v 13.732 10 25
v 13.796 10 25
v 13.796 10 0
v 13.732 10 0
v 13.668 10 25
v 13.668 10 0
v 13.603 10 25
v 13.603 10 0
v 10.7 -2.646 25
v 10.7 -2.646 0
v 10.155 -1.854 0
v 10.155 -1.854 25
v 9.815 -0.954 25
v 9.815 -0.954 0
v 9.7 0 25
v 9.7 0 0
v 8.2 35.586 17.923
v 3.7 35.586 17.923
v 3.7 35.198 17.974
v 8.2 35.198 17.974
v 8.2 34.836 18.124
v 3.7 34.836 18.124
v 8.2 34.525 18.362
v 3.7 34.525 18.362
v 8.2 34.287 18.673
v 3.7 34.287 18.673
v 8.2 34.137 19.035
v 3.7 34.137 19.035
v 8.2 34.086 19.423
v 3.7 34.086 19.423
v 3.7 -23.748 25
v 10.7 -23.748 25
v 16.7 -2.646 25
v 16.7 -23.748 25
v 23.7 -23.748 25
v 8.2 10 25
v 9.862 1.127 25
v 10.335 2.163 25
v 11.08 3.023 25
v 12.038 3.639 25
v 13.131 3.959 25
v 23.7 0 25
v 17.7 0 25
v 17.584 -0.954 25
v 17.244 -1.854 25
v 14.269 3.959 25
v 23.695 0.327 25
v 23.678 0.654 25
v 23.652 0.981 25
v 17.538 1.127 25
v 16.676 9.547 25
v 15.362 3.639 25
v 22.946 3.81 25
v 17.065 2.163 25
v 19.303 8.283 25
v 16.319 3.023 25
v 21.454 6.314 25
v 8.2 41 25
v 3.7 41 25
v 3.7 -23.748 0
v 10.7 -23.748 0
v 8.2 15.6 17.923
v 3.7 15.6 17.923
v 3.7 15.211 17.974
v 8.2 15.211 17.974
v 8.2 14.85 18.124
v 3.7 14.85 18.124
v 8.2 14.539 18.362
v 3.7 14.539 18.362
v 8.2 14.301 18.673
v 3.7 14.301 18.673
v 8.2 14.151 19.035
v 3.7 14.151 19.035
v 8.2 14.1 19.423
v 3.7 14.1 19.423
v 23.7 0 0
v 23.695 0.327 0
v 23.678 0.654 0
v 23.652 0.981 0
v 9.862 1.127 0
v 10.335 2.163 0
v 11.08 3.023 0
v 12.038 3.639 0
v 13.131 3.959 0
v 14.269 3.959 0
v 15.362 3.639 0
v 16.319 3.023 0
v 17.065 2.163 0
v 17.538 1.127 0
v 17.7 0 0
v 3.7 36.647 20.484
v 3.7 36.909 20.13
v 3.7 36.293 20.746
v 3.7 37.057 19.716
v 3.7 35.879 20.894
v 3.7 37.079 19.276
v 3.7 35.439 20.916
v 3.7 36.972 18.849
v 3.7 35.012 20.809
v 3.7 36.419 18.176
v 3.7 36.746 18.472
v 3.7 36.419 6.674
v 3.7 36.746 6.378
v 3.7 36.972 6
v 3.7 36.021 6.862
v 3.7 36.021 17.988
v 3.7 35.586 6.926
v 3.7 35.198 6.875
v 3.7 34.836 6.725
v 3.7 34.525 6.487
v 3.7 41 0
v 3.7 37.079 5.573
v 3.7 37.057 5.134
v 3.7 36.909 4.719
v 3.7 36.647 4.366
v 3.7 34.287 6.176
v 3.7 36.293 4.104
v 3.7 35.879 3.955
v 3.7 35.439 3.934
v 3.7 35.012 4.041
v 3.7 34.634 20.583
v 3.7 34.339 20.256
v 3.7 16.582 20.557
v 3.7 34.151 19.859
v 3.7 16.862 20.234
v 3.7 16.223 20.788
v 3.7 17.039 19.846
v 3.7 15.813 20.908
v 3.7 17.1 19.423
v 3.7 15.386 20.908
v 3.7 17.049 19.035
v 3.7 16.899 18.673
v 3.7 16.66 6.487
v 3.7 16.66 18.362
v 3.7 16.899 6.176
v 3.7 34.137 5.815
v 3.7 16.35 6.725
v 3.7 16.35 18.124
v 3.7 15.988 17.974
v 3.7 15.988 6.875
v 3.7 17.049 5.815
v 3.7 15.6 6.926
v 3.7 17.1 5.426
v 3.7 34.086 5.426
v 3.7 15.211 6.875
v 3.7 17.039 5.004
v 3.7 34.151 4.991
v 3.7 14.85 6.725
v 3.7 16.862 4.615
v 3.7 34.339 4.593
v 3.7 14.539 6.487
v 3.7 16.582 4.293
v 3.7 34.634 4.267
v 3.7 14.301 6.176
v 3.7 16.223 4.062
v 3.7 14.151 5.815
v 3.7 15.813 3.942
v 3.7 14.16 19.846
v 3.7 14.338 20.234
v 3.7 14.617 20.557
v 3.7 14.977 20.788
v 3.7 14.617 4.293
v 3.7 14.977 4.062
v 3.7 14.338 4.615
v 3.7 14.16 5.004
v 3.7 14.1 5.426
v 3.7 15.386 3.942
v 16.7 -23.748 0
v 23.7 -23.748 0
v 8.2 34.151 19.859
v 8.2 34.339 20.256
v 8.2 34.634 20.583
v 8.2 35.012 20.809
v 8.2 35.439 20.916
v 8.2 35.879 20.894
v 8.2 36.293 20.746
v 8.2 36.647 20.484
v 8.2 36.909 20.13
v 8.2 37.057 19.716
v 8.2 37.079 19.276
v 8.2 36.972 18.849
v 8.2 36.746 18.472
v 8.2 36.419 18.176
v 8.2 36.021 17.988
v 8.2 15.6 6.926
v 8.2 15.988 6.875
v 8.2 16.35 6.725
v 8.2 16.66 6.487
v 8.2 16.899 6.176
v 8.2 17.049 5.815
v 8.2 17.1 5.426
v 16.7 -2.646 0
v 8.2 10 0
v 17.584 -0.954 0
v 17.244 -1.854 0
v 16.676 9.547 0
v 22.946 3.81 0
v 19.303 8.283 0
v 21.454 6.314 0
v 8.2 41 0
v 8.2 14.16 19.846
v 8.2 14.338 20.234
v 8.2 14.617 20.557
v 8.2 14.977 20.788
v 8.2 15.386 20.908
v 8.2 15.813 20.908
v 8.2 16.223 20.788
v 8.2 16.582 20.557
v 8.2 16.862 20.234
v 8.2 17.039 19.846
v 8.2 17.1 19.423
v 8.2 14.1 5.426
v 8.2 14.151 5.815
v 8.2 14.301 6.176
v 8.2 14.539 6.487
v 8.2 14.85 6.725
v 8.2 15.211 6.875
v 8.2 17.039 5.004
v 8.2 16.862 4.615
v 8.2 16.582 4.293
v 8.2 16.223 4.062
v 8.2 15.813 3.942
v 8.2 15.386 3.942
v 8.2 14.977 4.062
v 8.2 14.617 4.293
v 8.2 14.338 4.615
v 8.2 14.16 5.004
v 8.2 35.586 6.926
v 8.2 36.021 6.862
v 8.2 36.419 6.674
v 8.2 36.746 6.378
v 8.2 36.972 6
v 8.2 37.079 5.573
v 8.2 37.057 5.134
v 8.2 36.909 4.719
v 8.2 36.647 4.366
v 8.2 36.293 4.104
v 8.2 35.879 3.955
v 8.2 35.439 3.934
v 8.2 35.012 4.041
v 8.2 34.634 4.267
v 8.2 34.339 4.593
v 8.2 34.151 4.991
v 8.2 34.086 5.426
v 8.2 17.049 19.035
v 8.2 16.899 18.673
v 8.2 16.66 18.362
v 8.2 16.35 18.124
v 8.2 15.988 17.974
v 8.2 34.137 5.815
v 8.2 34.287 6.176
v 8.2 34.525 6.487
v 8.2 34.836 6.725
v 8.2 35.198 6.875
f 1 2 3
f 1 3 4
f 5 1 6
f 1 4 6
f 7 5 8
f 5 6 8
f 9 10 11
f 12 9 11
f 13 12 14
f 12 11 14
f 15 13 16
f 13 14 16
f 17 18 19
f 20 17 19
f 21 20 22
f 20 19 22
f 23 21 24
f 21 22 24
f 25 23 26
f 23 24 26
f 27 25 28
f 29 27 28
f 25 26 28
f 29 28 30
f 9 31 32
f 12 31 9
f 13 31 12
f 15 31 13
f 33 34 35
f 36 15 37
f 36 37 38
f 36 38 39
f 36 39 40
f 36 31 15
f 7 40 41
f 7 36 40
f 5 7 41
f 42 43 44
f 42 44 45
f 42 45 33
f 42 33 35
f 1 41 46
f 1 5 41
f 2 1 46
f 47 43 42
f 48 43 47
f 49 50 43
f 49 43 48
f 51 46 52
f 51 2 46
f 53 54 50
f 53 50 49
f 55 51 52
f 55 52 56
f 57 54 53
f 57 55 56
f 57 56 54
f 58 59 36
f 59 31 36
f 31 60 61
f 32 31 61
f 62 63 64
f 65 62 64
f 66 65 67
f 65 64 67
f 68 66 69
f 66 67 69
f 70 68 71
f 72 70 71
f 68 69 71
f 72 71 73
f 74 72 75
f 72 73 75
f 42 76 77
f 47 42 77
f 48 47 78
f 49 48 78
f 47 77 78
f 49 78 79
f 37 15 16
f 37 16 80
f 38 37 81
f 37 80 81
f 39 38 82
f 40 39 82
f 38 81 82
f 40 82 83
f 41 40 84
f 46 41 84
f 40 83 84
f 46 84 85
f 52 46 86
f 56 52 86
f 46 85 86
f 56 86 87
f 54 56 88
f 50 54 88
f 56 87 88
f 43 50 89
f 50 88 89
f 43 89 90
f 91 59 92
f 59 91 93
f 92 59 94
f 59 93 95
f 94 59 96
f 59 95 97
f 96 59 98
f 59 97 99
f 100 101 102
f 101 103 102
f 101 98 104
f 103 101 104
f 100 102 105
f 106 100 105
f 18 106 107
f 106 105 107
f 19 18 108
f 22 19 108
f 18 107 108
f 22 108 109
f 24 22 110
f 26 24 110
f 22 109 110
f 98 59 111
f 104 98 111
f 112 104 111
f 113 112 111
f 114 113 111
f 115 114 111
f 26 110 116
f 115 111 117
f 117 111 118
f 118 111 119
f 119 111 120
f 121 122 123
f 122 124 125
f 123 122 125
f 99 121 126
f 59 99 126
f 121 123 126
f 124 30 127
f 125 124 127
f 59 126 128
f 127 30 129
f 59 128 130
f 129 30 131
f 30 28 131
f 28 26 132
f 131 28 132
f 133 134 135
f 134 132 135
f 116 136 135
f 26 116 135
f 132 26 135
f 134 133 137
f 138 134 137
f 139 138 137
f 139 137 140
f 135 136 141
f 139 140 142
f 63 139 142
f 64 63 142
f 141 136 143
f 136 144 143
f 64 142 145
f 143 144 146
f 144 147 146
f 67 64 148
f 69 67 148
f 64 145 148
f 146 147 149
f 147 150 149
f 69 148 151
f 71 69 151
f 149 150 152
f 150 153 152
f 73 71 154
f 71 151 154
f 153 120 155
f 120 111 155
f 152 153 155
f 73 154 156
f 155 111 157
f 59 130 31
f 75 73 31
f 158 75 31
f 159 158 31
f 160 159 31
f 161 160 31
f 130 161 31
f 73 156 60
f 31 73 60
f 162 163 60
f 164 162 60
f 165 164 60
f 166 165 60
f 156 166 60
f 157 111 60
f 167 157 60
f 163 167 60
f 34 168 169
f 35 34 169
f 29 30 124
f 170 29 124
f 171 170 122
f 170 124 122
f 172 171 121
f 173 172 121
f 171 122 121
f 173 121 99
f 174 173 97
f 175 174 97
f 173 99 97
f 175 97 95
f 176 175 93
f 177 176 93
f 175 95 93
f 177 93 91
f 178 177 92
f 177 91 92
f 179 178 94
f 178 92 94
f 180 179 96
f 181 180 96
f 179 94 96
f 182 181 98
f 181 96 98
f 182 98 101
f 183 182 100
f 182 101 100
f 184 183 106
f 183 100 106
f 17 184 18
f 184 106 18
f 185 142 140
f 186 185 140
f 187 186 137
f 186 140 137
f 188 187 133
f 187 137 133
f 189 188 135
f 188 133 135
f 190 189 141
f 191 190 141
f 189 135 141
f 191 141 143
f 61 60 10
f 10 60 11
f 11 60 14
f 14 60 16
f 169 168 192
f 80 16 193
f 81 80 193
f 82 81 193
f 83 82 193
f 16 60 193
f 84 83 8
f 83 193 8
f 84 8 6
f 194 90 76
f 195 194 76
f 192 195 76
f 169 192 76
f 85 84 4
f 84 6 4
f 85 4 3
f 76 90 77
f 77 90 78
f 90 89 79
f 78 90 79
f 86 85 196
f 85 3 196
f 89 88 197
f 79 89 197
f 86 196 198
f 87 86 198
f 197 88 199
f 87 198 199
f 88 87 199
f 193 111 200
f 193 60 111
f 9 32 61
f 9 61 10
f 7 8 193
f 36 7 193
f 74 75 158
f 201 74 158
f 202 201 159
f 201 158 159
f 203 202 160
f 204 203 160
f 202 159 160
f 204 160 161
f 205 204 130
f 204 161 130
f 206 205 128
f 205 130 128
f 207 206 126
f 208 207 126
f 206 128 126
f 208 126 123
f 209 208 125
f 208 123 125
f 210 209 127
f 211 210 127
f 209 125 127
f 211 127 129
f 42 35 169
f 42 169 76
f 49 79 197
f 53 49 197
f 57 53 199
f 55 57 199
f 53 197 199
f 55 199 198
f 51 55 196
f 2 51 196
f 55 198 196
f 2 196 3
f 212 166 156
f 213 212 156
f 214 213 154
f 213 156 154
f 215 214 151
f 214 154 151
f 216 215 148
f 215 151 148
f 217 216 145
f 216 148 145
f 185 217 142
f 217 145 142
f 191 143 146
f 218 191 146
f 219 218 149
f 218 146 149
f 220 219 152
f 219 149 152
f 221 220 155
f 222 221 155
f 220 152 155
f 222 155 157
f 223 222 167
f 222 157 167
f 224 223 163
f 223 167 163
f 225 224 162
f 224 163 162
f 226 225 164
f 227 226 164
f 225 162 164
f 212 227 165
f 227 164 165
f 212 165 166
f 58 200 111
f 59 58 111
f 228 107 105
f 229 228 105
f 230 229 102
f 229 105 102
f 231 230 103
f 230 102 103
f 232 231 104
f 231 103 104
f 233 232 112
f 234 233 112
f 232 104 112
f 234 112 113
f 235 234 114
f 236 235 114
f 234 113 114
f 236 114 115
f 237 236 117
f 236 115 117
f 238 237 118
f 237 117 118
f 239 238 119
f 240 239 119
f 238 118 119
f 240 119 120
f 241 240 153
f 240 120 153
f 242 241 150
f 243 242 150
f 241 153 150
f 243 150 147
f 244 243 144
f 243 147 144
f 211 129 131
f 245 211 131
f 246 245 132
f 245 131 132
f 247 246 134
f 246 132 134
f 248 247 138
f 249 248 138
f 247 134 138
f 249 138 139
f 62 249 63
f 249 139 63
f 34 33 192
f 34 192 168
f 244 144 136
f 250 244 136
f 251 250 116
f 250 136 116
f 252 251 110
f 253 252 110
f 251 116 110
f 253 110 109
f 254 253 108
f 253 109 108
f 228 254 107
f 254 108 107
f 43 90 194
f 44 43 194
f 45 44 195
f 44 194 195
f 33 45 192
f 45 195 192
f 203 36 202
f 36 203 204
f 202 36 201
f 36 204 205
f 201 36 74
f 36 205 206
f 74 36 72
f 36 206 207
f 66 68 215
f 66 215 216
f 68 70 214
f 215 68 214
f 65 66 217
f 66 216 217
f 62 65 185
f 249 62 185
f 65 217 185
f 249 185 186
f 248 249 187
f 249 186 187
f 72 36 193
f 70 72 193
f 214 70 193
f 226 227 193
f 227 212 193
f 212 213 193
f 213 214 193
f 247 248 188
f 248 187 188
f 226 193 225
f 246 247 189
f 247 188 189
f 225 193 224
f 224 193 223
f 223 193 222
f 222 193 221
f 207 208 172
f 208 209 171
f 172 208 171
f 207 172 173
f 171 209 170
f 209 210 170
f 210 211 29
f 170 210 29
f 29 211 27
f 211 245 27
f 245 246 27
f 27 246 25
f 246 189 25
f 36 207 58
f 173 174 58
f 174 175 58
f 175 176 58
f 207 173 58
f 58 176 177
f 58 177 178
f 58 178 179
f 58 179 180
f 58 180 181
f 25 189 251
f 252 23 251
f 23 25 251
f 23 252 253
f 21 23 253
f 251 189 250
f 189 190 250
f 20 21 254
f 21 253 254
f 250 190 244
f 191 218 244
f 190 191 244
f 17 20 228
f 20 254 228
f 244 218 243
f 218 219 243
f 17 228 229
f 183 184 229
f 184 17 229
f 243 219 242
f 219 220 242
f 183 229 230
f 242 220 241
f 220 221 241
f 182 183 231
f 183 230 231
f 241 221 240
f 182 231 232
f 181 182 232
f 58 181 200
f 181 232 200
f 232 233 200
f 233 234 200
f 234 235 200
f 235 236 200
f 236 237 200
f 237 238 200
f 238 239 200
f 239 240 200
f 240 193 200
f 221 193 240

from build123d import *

# Parameters (mm, degrees)
F1_DEPTH      = 25
F3_DEPTH      = 25
F3_DEPTH_BACK = 25


with BuildPart() as f1:
    # F0 (on Top) → F1 (new body)
    with BuildSketch(Plane.XY):
        with BuildLine():
            Line((3.69989, 0), (3.69989, -23.748155))
            Line((3.69989, -23.748155), (10.309355, -23.748155))
            Line((10.309355, -23.748155), (10.69989, -23.748155))
            Line((10.69989, -23.748155), (10.69989, -2.645751))
            ThreePointArc((10.69989, -2.645751), (9.958232, -1.414214), (9.69989, 0))
            Line((9.69989, 0), (3.69989, 0))
        make_face()
        with BuildLine():
            ThreePointArc((3.74811, 0.980861), (3.711952, 0.491023), (3.69989, 0))
            Line((3.69989, 0), (9.69989, 0))
            ThreePointArc((9.69989, 0), (13.69989, 4), (17.69989, 0))
            Line((17.69989, 0), (23.69989, 0))
            ThreePointArc((23.69989, 0), (23.687827, 0.491023), (23.651669, 0.980861))
            ThreePointArc((23.651669, 0.980861), (20.450878, 7.377273), (13.796338, 9.999535))
            Line((13.796338, 9.999535), (13.603441, 9.999535))
            Line((13.603441, 9.999535), (8.19989, 9.999535))
            Line((8.19989, 9.999535), (8.19989, 40.999535))
            Line((8.19989, 40.999535), (3.69989, 40.999535))
            Line((3.69989, 40.999535), (3.69989, 23.748155))
            Line((3.69989, 23.748155), (3.69989, 9.999535))
            Line((3.69989, 9.999535), (3.69989, 0.980861))
            Line((3.69989, 0.980861), (3.74811, 0.980861))
        make_face()
        with BuildLine():
            Line((3.69989, 0.980861), (3.69989, 0))
            ThreePointArc((3.69989, 0), (3.711952, 0.491023), (3.74811, 0.980861))
            Line((3.74811, 0.980861), (3.69989, 0.980861))
        make_face()
        with BuildLine():
            Line((23.69989, 0), (17.69989, 0))
            ThreePointArc((17.69989, 0), (17.441547, -1.414214), (16.69989, -2.645751))
            Line((16.69989, -2.645751), (16.69989, -23.748155))
            Line((16.69989, -23.748155), (23.69989, -23.748155))
            Line((23.69989, -23.748155), (23.69989, 0))
        make_face()
        with BuildLine():
            Line((13.603441, 9.999535), (13.796338, 9.999535))
            ThreePointArc((13.796338, 9.999535), (13.69989, 10), (13.603441, 9.999535))
        make_face()
    extrude(amount=F1_DEPTH)

    # F2 (on face) → F3 (cut, two sides)
    with BuildSketch(Plane(origin=(3.69989, 0, 0), x_dir=(0, -1, 0), z_dir=(-1, 0, 0))) as f3_sk:
        with BuildLine():
            Line((-15.599724, 5.426402), (-17.099724, 5.426402))
            ThreePointArc((-17.099724, 5.426402), (-15.599724, 3.926402), (-14.099724, 5.426402))
            ThreePointArc((-14.099724, 5.426402), (-14.539063, 6.487062), (-15.599724, 6.926402))
            Line((-15.599724, 6.926402), (-15.599724, 5.426402))
        make_face()
        with BuildLine():
            Line((-34.08602, 5.426402), (-35.58602, 5.426402))
            Line((-35.58602, 5.426402), (-35.58602, 6.926402))
            ThreePointArc((-35.58602, 6.926402), (-36.64668, 4.365742), (-34.08602, 5.426402))
        make_face()
        with BuildLine():
            Line((-15.599724, 19.423114), (-15.599724, 17.923114))
            ThreePointArc((-15.599724, 17.923114), (-14.539063, 18.362454), (-14.099724, 19.423114))
            ThreePointArc((-14.099724, 19.423114), (-15.599724, 20.923114), (-17.099724, 19.423114))
            Line((-17.099724, 19.423114), (-15.599724, 19.423114))
        make_face()
        with BuildLine():
            ThreePointArc((-17.099724, 19.423114), (-16.660384, 18.362454), (-15.599724, 17.923114))
            Line((-15.599724, 17.923114), (-15.599724, 19.423114))
            Line((-15.599724, 19.423114), (-17.099724, 19.423114))
        make_face()
        with BuildLine():
            Line((-35.58602, 19.423114), (-35.58602, 17.923114))
            ThreePointArc((-35.58602, 17.923114), (-34.52536, 18.362454), (-34.08602, 19.423114))
            Line((-34.08602, 19.423114), (-35.58602, 19.423114))
        make_face()
        with BuildLine():
            ThreePointArc((-34.08602, 19.423114), (-36.64668, 20.483774), (-35.58602, 17.923114))
            Line((-35.58602, 17.923114), (-35.58602, 19.423114))
            Line((-35.58602, 19.423114), (-34.08602, 19.423114))
        make_face()
        with BuildLine():
            Line((-35.58602, 6.926402), (-35.58602, 5.426402))
            Line((-35.58602, 5.426402), (-34.08602, 5.426402))
            ThreePointArc((-34.08602, 5.426402), (-34.52536, 6.487062), (-35.58602, 6.926402))
        make_face()
        with BuildLine():
            ThreePointArc((-15.599724, 6.926402), (-16.660384, 6.487062), (-17.099724, 5.426402))
            Line((-17.099724, 5.426402), (-15.599724, 5.426402))
            Line((-15.599724, 5.426402), (-15.599724, 6.926402))
        make_face()
    extrude(amount=F3_DEPTH, mode=Mode.SUBTRACT)
    extrude(f3_sk.sketch, amount=-F3_DEPTH_BACK, mode=Mode.SUBTRACT)


solid = f1.part
